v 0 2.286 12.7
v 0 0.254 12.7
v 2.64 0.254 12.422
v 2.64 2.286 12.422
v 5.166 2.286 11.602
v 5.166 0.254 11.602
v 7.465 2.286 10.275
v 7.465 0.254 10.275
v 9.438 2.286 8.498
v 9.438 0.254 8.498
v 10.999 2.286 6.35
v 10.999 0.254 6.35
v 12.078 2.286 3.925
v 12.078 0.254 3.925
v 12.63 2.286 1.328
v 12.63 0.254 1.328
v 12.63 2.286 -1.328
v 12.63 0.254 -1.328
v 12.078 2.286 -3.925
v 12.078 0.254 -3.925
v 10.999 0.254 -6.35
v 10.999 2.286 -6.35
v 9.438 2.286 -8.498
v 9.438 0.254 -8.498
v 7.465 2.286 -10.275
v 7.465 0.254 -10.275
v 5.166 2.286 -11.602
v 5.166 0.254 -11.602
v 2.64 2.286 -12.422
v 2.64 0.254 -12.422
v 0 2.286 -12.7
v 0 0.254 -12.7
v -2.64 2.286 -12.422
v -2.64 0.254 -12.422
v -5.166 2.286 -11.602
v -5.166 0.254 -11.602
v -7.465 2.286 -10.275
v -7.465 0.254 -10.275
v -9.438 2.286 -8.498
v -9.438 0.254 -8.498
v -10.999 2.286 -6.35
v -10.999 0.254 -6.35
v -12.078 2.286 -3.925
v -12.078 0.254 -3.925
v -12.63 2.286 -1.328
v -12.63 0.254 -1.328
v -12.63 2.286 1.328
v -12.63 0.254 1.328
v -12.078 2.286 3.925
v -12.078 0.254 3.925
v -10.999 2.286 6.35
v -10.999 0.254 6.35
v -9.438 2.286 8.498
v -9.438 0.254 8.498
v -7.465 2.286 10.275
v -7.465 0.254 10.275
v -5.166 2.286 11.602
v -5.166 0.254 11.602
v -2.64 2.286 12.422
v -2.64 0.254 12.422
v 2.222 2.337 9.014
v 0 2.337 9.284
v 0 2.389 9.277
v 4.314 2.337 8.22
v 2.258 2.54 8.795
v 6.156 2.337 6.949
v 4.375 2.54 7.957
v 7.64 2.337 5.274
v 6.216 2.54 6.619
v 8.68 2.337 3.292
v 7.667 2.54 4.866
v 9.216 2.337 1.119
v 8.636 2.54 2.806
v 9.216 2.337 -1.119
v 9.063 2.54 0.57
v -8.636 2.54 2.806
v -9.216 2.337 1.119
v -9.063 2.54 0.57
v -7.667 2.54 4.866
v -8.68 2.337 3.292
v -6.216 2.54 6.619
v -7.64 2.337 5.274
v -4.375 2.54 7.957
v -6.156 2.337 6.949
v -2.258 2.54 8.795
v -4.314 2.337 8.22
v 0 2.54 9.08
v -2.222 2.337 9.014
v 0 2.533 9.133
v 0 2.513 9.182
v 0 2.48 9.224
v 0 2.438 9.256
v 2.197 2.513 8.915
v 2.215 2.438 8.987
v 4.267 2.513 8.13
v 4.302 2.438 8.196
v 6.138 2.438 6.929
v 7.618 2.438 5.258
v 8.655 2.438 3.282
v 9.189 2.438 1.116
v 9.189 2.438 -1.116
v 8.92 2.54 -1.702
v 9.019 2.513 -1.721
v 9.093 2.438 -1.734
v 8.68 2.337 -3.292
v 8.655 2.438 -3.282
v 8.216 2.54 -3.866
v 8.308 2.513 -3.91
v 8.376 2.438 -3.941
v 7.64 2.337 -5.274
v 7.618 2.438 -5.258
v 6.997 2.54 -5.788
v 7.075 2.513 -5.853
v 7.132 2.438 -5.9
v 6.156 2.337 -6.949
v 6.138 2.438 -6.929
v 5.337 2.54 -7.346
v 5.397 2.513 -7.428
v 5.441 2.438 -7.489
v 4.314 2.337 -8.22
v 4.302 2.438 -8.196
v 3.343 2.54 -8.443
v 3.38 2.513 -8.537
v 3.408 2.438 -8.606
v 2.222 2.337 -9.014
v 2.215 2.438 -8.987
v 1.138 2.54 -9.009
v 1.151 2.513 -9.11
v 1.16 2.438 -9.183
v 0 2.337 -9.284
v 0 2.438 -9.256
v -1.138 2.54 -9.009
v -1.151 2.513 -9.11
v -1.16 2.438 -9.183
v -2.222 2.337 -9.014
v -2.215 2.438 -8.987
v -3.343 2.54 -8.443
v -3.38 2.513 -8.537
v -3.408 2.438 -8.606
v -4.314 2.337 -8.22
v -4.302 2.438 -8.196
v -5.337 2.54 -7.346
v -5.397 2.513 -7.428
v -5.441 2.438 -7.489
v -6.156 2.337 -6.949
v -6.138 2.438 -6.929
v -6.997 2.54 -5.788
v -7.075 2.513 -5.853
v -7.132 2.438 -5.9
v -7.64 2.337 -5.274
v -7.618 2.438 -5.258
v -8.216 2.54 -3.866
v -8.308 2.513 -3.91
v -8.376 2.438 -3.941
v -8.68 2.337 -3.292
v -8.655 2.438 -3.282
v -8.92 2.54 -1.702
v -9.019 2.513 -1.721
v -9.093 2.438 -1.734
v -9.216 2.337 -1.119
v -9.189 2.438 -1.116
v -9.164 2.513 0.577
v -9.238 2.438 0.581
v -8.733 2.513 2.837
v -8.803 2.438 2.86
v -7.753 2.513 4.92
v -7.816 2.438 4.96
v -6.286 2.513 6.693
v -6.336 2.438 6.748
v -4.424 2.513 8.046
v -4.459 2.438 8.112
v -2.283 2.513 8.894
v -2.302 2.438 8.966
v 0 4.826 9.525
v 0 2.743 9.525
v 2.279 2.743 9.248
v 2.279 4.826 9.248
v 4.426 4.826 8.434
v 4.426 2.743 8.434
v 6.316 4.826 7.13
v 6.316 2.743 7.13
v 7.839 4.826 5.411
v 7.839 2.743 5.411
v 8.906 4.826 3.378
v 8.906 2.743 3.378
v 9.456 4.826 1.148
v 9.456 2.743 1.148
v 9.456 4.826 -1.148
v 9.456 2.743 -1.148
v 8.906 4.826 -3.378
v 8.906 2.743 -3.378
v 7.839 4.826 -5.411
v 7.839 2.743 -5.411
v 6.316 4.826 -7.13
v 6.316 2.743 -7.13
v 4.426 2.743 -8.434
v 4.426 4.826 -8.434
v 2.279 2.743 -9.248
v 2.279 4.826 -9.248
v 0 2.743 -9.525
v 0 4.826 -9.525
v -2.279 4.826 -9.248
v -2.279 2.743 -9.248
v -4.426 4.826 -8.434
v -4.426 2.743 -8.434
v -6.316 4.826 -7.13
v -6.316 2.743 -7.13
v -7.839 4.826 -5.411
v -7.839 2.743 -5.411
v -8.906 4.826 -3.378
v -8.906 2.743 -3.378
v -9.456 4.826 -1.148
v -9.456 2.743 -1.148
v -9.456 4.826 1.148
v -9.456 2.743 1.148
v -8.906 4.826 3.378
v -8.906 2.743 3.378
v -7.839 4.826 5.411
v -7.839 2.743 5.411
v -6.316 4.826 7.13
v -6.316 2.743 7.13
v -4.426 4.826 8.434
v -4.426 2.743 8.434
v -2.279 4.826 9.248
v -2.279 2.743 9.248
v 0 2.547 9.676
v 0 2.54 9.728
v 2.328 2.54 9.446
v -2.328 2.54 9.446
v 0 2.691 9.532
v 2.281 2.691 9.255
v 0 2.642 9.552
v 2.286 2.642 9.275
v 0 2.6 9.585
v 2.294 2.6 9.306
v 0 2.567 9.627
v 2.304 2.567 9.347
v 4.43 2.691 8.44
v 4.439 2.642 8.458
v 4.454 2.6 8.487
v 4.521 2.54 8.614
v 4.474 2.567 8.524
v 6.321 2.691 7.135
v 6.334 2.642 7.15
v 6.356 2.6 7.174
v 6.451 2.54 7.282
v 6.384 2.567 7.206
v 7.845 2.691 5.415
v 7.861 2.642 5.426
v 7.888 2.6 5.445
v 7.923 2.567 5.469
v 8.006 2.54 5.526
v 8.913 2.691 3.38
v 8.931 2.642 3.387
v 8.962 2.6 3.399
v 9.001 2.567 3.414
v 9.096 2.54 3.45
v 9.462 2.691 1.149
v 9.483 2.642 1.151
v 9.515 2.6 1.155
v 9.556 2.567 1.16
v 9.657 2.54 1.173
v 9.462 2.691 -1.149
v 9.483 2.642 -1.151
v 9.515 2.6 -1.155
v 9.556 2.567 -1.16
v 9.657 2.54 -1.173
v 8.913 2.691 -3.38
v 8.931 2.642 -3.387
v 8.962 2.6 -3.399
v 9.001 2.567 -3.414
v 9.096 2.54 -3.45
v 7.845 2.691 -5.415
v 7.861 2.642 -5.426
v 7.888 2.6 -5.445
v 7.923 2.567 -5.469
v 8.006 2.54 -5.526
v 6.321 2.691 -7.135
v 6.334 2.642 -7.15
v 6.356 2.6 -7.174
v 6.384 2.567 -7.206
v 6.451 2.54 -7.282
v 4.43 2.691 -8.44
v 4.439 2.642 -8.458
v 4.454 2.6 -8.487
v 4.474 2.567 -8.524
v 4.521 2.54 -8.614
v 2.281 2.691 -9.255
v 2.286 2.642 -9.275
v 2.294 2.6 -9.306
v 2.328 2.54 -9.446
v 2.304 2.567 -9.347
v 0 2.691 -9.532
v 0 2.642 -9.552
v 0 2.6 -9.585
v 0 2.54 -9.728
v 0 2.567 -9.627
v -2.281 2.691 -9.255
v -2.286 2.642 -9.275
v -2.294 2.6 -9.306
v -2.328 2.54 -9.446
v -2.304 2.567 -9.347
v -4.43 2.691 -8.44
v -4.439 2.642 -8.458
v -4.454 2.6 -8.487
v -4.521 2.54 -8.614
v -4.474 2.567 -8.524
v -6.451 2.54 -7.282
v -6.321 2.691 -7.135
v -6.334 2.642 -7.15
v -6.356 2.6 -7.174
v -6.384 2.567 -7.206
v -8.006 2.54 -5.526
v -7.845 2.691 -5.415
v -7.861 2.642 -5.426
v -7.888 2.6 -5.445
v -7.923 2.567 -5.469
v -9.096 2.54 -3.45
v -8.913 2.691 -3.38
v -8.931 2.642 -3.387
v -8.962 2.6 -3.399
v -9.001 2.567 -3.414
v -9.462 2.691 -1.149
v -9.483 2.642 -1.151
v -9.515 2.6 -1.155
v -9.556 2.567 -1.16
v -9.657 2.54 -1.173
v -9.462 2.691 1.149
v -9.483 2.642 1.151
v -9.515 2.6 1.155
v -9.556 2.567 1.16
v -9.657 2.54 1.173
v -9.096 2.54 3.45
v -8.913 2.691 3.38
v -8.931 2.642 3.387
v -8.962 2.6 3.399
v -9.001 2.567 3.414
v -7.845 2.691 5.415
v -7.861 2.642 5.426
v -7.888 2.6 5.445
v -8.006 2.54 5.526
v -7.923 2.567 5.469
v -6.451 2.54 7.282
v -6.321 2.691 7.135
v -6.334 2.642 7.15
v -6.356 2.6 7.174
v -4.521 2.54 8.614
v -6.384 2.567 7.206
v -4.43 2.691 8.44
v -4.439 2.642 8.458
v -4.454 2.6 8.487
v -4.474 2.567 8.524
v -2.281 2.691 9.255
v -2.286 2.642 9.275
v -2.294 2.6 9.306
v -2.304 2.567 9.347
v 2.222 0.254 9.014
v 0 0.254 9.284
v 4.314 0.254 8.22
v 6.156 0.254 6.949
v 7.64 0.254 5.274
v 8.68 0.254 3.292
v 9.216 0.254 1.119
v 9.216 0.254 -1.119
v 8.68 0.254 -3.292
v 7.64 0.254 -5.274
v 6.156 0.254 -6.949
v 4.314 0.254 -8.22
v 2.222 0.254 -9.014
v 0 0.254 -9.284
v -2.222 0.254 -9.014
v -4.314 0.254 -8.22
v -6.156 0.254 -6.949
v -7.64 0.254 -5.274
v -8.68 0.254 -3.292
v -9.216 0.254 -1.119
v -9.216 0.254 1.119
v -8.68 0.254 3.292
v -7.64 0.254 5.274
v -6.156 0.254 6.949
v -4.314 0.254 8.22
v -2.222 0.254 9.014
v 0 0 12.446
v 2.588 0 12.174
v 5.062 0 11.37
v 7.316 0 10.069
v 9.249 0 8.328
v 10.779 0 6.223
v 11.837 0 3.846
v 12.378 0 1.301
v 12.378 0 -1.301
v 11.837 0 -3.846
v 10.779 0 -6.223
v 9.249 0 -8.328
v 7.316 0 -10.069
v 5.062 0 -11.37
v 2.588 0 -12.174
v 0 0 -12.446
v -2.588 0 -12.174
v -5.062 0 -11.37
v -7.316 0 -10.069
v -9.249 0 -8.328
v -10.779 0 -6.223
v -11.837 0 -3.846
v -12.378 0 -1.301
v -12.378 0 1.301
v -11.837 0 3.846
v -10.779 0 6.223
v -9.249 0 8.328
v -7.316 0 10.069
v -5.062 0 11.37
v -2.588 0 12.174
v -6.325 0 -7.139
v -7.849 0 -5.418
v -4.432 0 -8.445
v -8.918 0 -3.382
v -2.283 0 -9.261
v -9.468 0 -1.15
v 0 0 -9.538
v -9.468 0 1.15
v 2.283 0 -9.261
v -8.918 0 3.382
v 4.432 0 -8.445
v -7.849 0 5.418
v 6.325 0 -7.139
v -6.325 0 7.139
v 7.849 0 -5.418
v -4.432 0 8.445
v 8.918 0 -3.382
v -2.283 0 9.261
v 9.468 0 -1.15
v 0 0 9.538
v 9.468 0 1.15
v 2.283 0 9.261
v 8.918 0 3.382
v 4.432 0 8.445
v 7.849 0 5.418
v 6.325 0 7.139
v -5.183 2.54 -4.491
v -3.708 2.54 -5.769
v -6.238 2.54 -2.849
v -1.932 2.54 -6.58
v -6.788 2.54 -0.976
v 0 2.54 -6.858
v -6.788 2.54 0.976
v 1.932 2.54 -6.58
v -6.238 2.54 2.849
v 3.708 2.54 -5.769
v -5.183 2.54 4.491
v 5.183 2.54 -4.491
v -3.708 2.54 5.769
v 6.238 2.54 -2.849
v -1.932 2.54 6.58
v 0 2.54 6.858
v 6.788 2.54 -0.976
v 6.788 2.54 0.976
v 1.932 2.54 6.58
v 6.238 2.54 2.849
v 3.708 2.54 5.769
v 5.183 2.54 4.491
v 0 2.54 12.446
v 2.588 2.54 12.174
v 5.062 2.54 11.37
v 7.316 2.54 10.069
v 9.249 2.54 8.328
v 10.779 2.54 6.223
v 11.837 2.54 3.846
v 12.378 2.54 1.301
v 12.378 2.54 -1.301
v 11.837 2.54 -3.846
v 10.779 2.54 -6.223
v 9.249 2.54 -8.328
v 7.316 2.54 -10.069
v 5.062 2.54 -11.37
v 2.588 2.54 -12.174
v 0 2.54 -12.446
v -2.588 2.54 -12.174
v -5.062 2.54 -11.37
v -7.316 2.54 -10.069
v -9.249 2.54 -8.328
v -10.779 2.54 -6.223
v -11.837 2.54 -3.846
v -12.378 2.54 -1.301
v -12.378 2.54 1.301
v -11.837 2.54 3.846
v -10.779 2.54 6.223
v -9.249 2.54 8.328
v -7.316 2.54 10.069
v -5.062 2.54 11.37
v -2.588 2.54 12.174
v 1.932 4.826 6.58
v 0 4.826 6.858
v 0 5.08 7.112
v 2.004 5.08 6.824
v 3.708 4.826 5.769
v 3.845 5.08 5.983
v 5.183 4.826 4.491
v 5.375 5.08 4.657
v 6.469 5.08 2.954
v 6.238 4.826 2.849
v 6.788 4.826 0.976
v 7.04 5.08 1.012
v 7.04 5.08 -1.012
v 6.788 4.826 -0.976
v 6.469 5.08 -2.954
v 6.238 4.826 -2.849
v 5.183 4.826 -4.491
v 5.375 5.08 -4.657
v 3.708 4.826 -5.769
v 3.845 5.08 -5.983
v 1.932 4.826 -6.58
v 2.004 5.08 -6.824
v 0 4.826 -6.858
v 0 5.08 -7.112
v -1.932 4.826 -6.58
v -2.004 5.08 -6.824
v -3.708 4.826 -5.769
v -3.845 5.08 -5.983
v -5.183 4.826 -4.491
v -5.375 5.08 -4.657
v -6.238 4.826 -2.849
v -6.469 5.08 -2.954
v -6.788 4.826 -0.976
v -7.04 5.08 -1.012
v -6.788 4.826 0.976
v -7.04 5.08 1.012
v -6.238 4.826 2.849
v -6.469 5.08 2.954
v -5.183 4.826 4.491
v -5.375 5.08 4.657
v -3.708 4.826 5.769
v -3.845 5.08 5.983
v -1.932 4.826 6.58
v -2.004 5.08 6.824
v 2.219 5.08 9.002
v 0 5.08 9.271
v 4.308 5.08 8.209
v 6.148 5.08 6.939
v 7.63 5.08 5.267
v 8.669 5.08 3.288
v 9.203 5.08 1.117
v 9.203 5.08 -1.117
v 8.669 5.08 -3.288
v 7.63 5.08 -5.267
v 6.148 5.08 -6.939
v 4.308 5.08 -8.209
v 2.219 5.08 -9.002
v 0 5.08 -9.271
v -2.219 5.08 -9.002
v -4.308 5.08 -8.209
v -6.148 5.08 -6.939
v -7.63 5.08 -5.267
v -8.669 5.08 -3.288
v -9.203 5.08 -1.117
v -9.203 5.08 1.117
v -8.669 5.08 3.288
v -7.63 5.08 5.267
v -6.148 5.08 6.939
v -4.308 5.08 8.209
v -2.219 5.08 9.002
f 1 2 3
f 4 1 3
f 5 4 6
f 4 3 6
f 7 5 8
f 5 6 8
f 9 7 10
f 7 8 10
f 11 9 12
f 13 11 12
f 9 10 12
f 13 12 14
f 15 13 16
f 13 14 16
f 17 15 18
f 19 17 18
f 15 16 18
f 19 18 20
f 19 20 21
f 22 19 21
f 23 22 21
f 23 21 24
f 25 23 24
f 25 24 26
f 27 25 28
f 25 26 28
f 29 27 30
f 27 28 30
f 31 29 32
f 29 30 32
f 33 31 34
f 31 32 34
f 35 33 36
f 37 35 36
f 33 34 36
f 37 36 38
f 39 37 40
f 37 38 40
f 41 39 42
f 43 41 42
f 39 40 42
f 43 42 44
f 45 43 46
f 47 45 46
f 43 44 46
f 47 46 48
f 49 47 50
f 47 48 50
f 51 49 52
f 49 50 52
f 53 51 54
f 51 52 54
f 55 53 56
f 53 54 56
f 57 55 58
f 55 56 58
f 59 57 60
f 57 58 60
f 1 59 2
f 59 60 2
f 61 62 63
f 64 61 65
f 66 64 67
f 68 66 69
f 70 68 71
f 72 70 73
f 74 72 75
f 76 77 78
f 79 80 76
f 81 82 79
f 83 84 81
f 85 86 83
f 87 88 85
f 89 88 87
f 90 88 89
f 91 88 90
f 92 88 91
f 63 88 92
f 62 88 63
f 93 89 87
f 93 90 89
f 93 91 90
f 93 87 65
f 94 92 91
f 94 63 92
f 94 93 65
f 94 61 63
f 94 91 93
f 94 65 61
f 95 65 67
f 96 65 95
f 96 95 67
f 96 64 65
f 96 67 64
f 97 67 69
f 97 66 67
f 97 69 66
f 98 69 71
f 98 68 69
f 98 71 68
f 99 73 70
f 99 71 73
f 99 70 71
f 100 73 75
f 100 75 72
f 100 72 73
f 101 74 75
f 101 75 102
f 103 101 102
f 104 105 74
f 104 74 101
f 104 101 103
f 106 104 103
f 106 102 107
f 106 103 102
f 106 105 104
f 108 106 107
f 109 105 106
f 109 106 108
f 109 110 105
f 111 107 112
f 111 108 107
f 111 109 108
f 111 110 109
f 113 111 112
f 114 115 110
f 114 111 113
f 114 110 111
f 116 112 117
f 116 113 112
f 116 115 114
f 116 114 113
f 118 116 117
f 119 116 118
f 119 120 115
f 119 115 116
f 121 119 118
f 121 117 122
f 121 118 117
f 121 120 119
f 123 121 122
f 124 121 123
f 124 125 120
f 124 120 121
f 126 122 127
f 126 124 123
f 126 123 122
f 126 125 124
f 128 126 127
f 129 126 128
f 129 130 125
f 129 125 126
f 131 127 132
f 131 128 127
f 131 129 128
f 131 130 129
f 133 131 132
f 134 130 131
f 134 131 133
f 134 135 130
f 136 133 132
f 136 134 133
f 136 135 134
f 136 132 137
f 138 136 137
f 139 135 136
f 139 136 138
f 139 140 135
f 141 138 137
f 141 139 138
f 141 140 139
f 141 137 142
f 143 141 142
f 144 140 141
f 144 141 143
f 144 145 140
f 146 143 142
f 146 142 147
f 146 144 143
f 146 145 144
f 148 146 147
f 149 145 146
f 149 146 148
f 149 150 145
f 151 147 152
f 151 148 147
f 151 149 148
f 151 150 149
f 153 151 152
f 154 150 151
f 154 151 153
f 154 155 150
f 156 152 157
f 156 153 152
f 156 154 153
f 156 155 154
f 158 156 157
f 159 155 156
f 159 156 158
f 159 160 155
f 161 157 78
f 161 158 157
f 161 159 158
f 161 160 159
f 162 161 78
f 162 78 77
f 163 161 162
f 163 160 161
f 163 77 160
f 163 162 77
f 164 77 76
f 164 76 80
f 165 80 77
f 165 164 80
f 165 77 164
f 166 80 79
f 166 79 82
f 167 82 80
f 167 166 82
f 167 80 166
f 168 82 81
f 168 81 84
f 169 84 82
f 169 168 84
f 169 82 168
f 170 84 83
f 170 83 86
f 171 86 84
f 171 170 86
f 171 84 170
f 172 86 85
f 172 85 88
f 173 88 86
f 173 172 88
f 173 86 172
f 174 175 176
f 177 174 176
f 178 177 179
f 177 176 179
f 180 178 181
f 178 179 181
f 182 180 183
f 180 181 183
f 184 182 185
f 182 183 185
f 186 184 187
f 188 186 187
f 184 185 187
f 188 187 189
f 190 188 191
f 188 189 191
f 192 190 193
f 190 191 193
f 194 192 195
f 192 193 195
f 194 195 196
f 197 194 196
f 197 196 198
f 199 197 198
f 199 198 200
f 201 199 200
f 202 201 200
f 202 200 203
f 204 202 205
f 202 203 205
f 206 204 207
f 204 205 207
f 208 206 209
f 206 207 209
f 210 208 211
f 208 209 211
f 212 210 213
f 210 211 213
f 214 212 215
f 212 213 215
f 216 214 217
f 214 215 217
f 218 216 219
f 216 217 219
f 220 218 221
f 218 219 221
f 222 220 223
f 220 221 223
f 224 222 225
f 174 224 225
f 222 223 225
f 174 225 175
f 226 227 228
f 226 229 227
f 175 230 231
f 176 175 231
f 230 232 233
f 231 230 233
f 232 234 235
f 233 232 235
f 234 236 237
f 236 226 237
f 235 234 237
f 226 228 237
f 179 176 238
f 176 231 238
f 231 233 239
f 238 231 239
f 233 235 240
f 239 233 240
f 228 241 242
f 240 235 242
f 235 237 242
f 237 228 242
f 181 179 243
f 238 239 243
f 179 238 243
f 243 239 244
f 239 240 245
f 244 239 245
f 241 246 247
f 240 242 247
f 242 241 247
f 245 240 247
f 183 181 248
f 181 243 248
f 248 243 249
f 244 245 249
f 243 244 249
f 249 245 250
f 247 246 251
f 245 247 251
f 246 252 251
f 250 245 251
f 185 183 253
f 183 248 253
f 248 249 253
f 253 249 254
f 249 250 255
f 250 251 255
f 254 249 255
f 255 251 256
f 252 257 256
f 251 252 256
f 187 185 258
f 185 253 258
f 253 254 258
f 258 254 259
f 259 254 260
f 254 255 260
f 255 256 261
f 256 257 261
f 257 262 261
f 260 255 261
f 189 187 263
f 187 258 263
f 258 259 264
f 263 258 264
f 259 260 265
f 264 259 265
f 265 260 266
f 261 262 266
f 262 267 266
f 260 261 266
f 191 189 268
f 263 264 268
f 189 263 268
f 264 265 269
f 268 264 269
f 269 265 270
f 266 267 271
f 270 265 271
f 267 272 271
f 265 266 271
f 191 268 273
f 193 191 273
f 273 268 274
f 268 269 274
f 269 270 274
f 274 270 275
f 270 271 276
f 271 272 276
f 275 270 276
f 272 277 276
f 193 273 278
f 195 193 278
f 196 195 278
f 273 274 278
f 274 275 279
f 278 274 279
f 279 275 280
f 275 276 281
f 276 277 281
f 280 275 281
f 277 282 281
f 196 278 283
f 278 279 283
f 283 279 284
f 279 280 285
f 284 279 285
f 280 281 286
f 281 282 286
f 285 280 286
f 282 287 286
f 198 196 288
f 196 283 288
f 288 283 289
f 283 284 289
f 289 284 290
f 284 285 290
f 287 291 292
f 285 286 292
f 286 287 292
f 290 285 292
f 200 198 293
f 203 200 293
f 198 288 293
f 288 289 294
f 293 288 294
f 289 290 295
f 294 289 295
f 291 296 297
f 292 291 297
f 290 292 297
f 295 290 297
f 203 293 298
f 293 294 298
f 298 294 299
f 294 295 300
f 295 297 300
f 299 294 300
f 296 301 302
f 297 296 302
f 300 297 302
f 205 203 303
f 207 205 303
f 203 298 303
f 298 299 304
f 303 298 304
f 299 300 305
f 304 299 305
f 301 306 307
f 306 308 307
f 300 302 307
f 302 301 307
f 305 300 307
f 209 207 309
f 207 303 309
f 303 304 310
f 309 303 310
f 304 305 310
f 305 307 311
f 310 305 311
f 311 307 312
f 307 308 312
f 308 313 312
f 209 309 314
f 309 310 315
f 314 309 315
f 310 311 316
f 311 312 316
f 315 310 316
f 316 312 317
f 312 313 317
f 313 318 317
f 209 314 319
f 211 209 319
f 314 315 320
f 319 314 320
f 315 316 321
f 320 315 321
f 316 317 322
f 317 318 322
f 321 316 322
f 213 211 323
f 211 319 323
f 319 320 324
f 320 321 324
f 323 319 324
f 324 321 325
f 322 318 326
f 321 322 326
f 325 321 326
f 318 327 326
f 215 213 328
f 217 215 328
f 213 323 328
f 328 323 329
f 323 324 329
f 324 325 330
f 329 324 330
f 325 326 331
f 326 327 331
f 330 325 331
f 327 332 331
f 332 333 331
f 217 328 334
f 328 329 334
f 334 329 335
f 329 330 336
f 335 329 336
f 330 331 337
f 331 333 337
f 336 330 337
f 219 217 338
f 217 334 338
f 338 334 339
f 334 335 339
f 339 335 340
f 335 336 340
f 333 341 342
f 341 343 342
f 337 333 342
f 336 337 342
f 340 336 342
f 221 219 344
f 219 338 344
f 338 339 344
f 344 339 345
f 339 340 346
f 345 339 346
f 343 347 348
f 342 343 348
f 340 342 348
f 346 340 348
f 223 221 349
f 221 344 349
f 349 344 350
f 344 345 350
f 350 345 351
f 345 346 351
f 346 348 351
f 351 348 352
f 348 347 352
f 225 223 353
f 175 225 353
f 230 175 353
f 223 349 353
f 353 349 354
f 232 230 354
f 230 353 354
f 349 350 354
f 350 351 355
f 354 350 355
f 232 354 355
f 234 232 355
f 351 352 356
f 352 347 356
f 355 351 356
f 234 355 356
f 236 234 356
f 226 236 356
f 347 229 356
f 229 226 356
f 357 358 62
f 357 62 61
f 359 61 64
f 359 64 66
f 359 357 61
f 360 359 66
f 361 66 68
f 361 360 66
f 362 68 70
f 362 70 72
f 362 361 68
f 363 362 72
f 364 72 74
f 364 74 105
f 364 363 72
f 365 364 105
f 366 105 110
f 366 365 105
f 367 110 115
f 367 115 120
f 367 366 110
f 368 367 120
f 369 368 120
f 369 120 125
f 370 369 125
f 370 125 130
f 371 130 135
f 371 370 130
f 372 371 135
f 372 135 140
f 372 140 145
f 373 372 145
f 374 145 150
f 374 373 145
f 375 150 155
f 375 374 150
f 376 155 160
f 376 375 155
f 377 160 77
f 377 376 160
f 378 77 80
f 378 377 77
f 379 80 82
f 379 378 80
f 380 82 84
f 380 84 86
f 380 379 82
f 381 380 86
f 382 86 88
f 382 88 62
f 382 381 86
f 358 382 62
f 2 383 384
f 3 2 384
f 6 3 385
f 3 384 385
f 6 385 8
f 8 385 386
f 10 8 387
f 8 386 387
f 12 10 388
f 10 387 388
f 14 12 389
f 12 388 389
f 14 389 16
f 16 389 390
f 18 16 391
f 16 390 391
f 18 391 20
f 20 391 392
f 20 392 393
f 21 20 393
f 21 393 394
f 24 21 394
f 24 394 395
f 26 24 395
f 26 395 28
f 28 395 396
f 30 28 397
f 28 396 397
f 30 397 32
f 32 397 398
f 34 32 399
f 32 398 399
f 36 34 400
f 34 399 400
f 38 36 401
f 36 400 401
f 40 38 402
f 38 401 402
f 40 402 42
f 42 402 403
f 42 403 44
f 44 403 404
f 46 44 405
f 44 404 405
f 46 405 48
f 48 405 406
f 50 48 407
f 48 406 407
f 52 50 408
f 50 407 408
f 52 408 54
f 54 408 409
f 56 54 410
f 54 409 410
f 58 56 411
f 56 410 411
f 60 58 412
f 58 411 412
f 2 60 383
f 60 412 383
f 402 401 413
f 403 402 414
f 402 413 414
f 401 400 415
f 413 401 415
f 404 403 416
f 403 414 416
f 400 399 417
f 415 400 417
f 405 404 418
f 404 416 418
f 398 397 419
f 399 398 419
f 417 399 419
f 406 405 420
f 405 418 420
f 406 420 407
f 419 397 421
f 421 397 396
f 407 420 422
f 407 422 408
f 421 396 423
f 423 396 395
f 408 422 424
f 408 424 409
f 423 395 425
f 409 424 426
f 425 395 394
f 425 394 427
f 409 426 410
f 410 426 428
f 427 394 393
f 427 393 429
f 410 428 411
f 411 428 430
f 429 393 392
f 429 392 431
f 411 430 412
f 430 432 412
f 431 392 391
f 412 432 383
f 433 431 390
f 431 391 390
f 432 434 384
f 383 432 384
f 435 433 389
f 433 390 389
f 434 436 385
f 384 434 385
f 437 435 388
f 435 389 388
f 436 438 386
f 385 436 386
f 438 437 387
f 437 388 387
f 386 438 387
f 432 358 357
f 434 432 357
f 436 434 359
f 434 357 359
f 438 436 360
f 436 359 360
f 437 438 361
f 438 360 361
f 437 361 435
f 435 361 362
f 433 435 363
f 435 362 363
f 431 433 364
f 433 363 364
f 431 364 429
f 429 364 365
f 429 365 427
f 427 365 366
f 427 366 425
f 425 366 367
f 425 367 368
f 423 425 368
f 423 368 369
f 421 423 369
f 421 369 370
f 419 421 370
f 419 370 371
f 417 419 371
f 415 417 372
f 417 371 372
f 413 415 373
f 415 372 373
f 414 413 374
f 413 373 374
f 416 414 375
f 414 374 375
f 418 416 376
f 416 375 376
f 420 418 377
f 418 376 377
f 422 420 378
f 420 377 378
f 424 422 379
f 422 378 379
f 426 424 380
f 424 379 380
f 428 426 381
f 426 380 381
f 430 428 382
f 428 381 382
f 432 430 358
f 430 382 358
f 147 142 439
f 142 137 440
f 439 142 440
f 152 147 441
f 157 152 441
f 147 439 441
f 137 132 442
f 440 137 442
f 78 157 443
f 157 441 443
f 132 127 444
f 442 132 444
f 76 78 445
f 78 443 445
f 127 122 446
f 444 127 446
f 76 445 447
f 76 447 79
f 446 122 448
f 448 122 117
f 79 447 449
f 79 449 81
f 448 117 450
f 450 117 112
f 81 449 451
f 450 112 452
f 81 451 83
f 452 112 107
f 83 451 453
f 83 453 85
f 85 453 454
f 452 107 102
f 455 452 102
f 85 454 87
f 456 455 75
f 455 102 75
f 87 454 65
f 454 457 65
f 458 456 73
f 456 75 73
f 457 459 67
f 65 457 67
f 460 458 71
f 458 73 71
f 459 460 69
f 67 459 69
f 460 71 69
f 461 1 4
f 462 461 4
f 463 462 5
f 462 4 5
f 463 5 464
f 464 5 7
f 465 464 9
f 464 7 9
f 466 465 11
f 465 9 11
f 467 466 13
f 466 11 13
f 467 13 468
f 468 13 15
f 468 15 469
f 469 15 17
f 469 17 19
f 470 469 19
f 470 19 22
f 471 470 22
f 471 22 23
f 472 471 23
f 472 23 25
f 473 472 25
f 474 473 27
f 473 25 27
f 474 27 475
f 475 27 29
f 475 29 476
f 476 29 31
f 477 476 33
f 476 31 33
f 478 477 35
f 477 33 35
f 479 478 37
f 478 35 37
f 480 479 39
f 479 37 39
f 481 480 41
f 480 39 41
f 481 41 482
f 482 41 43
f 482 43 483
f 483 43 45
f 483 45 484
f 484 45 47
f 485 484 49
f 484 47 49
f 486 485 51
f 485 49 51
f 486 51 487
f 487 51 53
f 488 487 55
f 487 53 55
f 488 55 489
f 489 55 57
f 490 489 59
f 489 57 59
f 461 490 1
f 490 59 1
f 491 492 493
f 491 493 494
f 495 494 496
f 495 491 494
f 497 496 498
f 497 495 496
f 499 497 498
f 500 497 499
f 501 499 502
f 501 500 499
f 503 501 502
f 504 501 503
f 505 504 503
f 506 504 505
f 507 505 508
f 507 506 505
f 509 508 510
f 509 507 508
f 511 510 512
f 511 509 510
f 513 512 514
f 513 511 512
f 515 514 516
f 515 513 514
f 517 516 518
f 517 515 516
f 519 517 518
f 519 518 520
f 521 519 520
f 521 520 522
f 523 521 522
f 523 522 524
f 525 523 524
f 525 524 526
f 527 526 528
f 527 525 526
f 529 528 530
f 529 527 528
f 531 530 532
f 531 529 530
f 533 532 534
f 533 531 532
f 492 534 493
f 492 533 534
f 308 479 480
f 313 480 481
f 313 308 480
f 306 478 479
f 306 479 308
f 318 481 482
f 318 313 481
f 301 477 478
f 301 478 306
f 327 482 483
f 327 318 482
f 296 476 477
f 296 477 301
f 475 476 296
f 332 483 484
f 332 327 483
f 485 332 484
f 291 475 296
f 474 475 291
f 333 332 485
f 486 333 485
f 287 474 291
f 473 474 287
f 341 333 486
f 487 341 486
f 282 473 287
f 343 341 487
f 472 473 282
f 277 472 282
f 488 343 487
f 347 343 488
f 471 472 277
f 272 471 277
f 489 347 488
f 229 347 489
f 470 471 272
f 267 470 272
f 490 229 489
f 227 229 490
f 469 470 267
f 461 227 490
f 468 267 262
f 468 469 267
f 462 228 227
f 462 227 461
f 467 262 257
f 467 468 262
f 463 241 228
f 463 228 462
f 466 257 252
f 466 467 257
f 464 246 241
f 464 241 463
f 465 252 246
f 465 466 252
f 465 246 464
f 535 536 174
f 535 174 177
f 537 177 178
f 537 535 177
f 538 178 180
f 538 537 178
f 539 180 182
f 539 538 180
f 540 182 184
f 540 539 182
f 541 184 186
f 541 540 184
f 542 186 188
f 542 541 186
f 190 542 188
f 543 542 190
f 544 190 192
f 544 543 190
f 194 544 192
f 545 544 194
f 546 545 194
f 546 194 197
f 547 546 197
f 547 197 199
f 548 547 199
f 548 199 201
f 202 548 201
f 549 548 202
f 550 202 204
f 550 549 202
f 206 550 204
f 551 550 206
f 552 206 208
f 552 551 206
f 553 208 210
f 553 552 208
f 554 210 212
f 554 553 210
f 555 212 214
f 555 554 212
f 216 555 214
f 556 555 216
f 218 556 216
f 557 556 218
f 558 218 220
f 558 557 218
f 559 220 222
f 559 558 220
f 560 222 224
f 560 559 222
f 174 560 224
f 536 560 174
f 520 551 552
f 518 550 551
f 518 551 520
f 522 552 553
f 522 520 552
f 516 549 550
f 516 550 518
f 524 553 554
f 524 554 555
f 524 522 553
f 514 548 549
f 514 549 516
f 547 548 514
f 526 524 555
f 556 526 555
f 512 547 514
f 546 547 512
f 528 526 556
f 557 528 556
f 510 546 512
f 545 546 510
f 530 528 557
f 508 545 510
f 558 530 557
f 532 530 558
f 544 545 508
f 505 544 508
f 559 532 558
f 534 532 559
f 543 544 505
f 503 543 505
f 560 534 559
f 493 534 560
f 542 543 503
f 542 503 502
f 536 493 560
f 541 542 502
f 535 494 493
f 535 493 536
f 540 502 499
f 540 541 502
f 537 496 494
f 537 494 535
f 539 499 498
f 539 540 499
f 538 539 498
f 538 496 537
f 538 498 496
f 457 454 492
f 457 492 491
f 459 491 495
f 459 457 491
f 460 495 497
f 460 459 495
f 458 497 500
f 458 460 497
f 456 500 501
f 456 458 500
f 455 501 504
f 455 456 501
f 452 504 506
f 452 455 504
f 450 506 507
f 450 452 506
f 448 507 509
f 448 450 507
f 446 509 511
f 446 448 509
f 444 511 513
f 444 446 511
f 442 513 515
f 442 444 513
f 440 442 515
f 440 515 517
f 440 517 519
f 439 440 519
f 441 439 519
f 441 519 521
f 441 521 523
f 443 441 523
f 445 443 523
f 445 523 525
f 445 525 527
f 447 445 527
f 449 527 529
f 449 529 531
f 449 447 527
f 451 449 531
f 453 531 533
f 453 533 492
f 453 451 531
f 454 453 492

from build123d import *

# Parameters (mm, degrees)
SKETCH2_R           = 12.7
SKETCH2_R_2         = 9.2837
BOSS_EXTRUDE1_DEPTH = 2.54
SKETCH3_R           = 9.525
SKETCH3_R_2         = 6.858
BOSS_EXTRUDE2_DEPTH = 2.54
FILLET1_R           = 0.2032
CHAMFER1_SIZE       = 0.254


with BuildPart() as part:
    # Sketch2 → Boss-Extrude1 (new body)
    with BuildSketch(Plane(origin=(0, 0, 0), x_dir=(1, 0, 0), z_dir=(0, 1, 0))):
        with Locations(Location((0, 0, 0), (0, 0, 270))):
            Circle(SKETCH2_R)
        with Locations(Location((0, 0, 0), (0, 0, 270))):
            Circle(SKETCH2_R_2, mode=Mode.SUBTRACT)
    extrude(amount=BOSS_EXTRUDE1_DEPTH)

    # Sketch3 → Boss-Extrude2 (add)
    with BuildSketch(Plane(origin=(0, 2.54, 0), x_dir=(1, 0, 0), z_dir=(0, 1, 0))):
        with Locations(Location((0, 0, 0), (0, 0, 270))):
            Circle(SKETCH3_R)
        with Locations(Location((0, 0, 0), (0, 0, 270))):
            Circle(SKETCH3_R_2, mode=Mode.SUBTRACT)
    extrude(amount=BOSS_EXTRUDE2_DEPTH)

    # Fillet1
    fillet1_edges = [part.edges().sort_by_distance(p)[0] for p in [
        (0, 2.54, -9.2837),
        (0, 2.54, -9.525),
    ]]
    fillet(fillet1_edges, radius=FILLET1_R)

    # Chamfer1
    chamfer1_edges = [part.edges().sort_by_distance(p)[0] for p in [
        (0, 5.08, -6.858),
        (0, 2.54, -12.7),
        (0, 0, -12.7),
        (0, 0, -9.2837),
        (0, 5.08, -9.525),
    ]]
    chamfer(chamfer1_edges, length=CHAMFER1_SIZE)


solid = part.part
